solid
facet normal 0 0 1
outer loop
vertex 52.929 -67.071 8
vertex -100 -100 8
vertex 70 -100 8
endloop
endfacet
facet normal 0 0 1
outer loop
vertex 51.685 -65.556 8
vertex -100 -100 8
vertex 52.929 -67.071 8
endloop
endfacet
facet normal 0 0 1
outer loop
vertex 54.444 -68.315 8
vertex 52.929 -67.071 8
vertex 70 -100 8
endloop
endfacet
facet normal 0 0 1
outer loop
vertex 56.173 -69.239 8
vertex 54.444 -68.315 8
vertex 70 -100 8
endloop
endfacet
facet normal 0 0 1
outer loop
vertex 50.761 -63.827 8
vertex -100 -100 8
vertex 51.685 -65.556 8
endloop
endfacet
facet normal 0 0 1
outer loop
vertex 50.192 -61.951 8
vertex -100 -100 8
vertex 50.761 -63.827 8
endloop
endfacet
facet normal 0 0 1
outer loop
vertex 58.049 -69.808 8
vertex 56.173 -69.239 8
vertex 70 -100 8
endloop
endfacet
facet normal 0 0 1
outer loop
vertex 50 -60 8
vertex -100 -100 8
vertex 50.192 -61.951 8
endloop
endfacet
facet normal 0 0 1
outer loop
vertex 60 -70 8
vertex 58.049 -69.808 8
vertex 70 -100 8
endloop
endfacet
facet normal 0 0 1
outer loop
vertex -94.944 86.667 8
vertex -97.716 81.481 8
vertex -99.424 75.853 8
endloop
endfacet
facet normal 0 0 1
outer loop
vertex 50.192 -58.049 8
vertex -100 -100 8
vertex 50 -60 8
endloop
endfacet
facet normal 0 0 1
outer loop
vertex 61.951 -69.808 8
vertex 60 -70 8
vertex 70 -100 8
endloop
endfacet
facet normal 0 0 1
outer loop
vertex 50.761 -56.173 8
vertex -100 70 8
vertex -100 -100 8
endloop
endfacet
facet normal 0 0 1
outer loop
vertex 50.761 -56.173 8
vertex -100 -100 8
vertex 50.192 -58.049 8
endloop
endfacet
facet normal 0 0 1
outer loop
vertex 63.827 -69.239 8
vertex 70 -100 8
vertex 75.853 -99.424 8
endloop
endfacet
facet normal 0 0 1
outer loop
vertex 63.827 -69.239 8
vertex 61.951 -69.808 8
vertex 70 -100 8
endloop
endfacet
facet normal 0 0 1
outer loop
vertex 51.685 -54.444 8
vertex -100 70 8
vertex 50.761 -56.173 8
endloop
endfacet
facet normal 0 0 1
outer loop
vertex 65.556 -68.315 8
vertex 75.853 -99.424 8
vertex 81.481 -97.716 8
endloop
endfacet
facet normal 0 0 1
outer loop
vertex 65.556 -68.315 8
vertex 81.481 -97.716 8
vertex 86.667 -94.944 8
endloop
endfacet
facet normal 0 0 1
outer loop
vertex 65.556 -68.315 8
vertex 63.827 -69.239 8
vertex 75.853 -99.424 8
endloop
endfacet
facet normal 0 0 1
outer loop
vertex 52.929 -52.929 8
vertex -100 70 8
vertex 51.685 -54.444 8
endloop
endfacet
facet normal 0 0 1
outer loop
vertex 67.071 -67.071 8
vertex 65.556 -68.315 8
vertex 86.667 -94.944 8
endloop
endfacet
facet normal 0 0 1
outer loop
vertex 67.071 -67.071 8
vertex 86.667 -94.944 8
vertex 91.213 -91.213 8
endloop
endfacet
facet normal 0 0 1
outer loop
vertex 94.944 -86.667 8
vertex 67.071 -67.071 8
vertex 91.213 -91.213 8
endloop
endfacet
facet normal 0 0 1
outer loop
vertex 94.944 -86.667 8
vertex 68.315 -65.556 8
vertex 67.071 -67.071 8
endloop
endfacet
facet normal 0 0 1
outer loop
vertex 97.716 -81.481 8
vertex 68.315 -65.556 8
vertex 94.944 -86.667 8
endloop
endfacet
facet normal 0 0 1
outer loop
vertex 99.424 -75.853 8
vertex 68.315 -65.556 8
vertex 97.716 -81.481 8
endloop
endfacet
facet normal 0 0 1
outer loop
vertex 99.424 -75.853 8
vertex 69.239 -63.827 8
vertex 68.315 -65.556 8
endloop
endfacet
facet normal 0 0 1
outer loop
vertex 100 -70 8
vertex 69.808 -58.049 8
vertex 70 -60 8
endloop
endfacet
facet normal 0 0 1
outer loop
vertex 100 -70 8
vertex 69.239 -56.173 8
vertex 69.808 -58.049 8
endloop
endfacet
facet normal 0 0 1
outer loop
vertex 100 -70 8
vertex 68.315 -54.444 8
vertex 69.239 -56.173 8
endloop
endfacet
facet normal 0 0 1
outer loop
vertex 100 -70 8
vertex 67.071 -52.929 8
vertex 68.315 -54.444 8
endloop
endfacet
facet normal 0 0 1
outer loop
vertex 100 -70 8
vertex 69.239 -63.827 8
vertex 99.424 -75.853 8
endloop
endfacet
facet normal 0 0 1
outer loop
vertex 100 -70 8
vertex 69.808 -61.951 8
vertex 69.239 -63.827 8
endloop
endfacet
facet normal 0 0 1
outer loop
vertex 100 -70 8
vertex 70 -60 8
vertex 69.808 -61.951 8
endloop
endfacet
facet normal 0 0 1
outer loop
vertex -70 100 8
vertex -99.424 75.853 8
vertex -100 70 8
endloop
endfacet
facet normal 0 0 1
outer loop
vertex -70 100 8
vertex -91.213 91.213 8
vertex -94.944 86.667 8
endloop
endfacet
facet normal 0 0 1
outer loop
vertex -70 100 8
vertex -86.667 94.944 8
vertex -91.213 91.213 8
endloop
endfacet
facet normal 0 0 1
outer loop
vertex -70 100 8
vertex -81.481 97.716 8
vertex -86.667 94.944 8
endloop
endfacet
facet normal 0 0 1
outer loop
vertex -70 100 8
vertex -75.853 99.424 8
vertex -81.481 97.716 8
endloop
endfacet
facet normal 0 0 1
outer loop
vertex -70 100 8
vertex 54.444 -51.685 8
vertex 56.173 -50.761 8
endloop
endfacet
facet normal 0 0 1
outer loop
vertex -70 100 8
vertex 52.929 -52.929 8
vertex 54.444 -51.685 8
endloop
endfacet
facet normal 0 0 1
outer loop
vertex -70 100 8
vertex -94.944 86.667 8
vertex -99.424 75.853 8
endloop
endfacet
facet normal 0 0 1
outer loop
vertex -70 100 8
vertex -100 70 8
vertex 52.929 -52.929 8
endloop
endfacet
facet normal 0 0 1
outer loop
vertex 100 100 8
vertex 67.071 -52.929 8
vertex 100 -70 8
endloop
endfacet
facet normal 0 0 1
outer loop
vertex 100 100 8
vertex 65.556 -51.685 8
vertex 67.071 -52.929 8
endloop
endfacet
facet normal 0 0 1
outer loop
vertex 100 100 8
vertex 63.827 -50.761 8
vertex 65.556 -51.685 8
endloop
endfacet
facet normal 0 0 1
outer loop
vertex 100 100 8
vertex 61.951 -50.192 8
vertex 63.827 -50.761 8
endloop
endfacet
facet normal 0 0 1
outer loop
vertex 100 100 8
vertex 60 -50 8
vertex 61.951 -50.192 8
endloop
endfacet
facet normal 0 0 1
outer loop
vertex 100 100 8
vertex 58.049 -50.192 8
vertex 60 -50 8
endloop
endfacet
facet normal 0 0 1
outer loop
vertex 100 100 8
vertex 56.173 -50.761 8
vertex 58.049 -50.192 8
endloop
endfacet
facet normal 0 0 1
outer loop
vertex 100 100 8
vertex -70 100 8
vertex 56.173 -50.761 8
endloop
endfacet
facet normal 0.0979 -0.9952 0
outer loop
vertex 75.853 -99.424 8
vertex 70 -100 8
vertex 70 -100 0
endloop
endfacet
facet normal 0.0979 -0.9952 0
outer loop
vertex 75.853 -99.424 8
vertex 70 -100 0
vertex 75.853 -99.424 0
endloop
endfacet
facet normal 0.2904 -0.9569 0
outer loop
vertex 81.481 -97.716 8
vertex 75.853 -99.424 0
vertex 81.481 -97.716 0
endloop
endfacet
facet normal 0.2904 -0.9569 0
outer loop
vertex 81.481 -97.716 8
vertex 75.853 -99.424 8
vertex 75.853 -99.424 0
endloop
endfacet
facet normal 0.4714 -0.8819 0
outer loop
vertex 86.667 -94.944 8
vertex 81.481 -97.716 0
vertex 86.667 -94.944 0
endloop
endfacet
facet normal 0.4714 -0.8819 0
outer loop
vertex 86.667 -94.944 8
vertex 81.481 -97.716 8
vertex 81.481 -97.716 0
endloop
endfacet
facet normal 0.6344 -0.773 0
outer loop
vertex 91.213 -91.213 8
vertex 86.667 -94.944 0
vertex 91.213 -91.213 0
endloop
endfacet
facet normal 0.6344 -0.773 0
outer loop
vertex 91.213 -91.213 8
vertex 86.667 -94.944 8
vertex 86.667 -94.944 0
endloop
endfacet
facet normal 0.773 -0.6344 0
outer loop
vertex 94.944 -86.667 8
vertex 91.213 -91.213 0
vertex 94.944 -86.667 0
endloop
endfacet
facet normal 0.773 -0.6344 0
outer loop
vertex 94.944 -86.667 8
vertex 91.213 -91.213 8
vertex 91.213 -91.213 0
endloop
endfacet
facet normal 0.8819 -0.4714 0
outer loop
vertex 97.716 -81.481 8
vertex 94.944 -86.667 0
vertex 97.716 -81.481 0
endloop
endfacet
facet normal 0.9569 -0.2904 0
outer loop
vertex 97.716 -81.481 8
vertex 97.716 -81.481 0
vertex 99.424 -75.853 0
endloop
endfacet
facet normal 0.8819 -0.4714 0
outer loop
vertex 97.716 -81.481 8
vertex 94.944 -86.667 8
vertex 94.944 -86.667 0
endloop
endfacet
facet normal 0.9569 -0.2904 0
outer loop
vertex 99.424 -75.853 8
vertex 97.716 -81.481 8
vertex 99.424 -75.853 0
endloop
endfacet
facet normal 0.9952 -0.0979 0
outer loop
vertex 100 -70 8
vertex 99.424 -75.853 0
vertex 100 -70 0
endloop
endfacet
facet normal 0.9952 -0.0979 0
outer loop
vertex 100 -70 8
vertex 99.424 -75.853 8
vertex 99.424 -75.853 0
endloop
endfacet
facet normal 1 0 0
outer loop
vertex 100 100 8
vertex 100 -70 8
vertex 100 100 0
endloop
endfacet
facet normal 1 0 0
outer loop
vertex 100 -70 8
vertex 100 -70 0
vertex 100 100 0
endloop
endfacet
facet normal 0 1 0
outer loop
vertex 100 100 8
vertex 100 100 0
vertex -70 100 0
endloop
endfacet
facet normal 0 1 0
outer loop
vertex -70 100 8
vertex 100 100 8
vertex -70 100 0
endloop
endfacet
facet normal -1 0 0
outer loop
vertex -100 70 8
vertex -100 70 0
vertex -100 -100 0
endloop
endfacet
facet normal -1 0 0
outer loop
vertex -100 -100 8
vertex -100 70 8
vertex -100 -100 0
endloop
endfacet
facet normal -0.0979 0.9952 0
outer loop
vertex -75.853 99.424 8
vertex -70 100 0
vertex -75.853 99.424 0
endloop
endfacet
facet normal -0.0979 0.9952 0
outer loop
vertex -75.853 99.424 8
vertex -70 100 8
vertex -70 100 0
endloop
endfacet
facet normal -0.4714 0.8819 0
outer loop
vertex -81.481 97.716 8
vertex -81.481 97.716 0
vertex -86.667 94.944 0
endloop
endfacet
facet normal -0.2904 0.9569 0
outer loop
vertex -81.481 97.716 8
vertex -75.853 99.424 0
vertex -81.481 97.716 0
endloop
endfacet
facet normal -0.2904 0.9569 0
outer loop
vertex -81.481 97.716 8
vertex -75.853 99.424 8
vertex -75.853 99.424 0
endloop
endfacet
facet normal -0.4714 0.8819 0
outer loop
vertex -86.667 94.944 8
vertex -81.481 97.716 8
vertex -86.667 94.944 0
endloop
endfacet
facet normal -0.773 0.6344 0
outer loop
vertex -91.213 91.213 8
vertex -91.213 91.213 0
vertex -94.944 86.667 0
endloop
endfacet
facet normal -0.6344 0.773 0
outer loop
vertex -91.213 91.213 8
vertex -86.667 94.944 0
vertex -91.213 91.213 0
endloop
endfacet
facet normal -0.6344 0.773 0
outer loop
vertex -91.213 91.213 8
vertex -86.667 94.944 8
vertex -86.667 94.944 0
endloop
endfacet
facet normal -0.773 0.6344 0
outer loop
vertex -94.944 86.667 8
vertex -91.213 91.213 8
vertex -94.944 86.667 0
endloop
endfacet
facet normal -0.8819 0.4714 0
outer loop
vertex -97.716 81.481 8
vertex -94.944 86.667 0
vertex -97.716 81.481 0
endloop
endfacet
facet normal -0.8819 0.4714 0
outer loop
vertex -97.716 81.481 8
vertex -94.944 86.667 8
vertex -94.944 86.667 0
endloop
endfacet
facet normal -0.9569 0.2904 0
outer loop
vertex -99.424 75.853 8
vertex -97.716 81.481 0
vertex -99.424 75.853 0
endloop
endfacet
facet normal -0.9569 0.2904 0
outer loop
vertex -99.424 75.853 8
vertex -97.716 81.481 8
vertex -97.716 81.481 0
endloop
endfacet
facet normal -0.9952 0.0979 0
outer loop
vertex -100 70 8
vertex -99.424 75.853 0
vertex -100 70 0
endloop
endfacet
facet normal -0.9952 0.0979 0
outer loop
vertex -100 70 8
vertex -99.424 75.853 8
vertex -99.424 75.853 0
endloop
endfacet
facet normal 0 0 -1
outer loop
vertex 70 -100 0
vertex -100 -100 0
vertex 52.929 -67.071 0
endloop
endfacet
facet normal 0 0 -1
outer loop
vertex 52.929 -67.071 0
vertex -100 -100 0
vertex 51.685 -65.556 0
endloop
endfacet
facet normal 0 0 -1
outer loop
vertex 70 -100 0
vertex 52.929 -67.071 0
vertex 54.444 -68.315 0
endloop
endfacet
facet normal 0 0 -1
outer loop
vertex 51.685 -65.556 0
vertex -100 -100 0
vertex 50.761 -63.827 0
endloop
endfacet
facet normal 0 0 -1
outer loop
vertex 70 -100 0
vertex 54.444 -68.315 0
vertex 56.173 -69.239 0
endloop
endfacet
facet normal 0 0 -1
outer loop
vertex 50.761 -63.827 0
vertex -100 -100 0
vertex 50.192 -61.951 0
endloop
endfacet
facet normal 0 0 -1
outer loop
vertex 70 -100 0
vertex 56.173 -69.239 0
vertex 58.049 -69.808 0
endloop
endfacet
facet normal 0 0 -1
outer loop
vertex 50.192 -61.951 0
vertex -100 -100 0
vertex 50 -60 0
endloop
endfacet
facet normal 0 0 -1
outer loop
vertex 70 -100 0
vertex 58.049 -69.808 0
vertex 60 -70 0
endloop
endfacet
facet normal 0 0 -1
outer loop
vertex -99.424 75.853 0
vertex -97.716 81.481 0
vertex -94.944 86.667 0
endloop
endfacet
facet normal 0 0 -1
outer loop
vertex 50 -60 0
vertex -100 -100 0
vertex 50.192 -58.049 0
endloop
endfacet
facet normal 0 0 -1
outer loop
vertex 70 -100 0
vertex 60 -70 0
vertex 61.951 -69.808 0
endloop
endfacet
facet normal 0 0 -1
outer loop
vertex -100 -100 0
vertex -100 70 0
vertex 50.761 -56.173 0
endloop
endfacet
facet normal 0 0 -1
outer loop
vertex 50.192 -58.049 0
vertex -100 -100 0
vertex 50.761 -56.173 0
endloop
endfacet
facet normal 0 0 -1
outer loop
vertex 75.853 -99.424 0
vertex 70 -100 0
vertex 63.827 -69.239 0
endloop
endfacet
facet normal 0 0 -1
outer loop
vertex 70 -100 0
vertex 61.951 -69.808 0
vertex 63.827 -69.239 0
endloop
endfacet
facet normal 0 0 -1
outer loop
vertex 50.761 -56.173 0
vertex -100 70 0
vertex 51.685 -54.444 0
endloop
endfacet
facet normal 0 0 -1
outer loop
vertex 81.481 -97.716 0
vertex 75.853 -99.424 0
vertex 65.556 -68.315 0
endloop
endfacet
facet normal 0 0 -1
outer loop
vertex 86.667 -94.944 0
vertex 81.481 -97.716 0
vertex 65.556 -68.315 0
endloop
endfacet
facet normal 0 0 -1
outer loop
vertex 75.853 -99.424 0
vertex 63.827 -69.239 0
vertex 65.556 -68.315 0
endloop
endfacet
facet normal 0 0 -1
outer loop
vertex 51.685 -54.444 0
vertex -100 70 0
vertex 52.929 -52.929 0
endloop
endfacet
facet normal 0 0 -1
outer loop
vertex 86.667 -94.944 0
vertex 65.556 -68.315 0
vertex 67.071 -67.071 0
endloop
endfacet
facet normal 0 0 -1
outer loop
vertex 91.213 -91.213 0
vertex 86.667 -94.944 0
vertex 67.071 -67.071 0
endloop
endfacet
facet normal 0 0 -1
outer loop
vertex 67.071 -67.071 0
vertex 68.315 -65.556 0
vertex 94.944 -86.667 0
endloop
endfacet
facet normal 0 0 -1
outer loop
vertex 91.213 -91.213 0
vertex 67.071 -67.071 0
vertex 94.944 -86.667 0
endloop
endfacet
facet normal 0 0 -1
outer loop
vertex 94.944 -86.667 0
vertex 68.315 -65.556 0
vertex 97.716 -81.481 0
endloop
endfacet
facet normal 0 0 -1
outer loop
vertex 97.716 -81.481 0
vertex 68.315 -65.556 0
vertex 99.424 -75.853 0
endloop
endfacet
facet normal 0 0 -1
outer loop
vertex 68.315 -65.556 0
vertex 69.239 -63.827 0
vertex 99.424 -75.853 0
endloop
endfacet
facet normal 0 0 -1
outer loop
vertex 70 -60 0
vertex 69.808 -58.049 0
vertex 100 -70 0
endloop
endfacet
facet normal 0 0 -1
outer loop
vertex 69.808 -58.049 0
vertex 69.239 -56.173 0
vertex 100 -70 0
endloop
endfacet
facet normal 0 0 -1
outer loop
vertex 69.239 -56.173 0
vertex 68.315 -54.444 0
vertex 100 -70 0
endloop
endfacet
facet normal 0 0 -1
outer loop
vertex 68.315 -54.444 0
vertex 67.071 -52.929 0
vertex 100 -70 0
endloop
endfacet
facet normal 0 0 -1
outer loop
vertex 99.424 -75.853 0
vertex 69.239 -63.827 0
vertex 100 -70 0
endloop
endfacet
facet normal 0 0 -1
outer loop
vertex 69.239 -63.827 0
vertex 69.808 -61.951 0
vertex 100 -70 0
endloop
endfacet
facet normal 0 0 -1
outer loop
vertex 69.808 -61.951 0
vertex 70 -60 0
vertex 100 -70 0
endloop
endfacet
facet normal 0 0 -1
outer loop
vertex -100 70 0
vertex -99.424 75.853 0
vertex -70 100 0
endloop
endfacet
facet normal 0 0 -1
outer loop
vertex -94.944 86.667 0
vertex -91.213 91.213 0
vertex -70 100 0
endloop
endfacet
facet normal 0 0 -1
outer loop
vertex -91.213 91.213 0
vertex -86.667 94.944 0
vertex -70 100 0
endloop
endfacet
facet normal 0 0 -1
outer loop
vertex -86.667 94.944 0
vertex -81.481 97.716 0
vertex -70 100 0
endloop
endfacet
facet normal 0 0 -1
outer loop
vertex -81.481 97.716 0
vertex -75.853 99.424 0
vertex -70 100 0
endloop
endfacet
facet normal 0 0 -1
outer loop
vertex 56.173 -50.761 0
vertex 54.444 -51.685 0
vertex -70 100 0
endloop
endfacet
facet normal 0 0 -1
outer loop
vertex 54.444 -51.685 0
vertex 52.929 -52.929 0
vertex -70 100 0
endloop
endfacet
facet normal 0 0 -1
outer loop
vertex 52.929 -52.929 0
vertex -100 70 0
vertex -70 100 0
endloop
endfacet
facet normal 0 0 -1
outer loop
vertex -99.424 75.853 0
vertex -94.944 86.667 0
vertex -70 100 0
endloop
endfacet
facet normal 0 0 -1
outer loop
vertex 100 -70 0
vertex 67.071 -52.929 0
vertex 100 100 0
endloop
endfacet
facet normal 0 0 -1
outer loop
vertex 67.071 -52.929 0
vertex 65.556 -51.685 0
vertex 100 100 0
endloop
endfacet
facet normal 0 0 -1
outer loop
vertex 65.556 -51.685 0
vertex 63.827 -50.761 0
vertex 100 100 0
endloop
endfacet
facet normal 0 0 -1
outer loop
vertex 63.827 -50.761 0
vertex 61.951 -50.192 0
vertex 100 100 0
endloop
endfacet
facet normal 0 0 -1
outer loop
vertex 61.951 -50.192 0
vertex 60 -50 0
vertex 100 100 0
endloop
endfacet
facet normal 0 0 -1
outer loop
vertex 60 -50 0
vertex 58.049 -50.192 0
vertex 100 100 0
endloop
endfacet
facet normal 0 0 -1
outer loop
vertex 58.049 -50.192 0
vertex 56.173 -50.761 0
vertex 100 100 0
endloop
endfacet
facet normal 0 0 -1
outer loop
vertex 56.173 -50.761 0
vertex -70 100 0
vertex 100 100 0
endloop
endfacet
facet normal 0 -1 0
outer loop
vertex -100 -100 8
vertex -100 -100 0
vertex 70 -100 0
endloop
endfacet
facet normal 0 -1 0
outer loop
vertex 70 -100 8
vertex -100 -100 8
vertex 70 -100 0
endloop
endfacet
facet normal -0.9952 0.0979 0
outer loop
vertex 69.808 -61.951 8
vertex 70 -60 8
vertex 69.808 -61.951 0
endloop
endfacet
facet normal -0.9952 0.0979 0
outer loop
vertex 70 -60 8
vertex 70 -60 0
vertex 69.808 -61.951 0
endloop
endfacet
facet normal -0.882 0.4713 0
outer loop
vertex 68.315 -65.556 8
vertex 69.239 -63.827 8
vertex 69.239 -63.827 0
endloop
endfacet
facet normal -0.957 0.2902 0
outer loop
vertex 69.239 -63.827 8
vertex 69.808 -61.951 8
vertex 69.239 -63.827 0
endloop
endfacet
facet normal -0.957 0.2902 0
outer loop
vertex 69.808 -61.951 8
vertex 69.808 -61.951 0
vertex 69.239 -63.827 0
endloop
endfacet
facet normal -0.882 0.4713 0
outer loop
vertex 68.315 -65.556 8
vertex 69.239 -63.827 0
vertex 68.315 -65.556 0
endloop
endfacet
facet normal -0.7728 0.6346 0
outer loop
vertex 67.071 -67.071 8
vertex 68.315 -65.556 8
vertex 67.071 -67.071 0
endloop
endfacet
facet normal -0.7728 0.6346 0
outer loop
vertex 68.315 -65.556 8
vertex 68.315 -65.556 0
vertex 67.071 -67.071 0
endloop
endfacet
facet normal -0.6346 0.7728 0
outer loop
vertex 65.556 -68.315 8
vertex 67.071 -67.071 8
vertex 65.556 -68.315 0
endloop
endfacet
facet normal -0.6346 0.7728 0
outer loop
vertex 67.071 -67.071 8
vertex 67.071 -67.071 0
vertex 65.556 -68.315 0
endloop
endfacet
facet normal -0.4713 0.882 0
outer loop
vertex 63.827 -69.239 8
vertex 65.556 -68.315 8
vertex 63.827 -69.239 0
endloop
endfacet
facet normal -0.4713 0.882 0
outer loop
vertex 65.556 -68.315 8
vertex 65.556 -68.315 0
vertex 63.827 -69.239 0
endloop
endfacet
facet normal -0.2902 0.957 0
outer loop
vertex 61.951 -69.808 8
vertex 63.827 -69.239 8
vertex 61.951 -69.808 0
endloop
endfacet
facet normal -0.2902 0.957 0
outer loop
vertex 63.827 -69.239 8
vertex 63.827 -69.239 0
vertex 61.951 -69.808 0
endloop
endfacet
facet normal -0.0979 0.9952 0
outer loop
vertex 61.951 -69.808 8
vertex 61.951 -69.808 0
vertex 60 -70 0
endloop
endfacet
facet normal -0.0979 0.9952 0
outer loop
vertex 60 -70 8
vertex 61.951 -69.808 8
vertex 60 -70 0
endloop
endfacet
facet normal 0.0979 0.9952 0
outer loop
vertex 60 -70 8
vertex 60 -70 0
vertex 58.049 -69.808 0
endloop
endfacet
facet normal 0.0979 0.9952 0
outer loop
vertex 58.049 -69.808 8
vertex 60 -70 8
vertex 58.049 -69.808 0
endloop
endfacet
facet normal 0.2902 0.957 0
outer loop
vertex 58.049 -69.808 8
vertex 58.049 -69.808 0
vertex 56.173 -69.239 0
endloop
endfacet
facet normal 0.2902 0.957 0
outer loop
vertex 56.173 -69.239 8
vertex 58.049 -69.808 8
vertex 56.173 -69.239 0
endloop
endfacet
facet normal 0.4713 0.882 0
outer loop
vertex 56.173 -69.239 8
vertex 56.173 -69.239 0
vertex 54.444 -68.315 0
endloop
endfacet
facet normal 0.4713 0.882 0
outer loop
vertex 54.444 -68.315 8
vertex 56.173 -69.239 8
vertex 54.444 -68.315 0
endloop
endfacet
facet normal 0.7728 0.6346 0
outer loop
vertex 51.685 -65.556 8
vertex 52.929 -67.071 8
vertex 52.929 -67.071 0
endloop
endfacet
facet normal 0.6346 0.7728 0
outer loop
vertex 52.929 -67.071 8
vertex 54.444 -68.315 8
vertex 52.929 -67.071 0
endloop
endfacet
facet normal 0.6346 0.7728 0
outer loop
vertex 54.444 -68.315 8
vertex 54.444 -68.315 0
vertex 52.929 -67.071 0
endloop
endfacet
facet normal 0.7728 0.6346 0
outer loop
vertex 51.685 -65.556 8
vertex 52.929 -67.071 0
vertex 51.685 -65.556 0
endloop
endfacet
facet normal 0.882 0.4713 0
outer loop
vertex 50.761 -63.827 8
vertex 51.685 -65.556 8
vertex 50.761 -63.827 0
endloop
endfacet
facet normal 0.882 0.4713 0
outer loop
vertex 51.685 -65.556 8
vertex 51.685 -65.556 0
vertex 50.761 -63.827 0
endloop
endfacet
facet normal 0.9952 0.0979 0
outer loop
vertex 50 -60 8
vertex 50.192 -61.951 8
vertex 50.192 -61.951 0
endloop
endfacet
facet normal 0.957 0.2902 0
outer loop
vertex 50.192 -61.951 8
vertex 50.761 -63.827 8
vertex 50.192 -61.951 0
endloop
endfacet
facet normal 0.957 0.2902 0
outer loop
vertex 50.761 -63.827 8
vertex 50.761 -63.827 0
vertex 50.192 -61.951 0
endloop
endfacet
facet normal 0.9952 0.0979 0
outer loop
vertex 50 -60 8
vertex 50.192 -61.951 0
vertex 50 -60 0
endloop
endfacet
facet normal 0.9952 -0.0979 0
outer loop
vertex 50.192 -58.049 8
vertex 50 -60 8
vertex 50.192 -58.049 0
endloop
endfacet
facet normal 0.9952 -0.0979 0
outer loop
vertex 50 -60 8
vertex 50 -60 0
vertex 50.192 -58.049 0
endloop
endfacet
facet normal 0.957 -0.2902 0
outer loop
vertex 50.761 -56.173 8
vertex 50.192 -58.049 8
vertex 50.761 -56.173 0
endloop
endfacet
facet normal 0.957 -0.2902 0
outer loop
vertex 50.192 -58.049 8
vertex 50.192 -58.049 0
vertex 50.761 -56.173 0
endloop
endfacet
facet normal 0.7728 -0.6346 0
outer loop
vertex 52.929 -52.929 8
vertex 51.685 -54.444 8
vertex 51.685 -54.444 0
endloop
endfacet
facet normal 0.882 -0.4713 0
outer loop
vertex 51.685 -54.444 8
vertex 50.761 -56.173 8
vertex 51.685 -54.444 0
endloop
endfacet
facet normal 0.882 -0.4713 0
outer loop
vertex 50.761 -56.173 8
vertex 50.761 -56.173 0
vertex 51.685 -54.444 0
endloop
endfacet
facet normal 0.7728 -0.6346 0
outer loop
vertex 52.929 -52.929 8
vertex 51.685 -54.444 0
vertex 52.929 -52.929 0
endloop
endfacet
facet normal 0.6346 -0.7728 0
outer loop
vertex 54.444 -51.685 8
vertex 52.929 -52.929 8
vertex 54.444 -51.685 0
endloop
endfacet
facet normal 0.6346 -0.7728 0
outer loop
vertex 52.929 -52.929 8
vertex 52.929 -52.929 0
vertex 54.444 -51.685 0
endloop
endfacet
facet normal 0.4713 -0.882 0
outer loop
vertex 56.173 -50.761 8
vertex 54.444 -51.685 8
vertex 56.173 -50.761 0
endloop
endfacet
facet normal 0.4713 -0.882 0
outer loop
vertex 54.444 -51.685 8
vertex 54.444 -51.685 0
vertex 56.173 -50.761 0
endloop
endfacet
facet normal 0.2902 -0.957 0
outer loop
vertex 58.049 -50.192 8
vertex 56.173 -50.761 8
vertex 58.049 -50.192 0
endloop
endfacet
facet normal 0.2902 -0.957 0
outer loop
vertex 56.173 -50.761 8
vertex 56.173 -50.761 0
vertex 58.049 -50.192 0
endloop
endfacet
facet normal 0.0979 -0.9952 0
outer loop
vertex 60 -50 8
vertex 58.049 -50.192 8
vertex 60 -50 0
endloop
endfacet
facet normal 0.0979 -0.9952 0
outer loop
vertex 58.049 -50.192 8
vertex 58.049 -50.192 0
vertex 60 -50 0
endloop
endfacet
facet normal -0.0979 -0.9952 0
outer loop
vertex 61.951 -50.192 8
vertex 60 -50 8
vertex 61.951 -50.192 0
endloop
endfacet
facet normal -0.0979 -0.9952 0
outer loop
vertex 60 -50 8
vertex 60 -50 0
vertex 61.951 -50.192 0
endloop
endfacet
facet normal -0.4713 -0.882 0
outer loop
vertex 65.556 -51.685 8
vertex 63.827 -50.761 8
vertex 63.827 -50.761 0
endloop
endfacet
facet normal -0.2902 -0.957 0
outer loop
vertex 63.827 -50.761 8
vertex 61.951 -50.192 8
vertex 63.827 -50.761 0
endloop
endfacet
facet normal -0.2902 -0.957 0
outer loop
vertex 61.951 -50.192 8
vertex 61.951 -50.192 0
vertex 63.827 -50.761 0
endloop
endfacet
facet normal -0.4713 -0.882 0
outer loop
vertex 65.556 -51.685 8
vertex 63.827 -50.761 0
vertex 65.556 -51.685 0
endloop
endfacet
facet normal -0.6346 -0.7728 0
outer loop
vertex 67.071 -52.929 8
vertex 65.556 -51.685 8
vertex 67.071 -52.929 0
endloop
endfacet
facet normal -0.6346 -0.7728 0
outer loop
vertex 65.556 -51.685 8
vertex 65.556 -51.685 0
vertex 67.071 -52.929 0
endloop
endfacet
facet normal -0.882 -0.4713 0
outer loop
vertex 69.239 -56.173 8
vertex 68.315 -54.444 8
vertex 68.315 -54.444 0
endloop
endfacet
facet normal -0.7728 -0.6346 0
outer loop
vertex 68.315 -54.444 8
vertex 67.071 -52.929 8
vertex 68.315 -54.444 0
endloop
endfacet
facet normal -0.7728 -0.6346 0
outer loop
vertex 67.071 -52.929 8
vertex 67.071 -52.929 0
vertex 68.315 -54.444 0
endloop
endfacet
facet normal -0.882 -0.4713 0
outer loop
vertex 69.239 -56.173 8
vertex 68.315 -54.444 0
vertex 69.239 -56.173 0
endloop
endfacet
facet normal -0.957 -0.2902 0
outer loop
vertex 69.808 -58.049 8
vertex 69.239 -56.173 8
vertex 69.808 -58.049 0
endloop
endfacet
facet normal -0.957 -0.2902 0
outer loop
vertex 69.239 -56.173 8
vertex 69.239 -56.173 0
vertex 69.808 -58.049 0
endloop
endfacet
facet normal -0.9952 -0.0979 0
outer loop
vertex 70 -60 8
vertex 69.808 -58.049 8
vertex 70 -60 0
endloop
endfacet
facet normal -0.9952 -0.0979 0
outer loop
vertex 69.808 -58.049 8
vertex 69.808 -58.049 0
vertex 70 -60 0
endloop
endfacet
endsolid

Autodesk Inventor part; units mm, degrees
ref_plane "YZ Plane" through (0, 0, 0) normal (1, 0, 0) x (0, 1, 0)
ref_plane "XZ Plane" through (0, 0, 0) normal (0, 1, 0) x (-1, 0, 0)
ref_plane "XY Plane" through (0, 0, 0) normal (0, 0, 1) x (1, 0, 0)
sketch "Sketch1" plane through (0, 0, 0) normal (0, 0, 1) x (1, 0, 0)
  line L0 (-100, -100) -> (100, -100)
  line L1 (100, -100) -> (100, 100)
  line L2 (100, 100) -> (-100, 100)
  line L3 (-100, 100) -> (-100, -100)
  line L4 (-100, -100) -> (100, 100) construction
  line L5 (100, -100) -> (-100, 100) construction
  circle A0 centre (60, -60) radius 10
  line L6 (-40, 100) -> (-40, 40)
  line L7 (-40, 40) -> (-100, 40)
  point P0 (0, 0)
  dimension "d154" = 200
  dimension "d155" = 200
  dimension "d157" = 20
  dimension "d158" = 40
  dimension "d159" = 40
  dimension "d161" = 60
extrude "Plate5" add sketch "Sketch1" along normal blind 8
fillet "Corner Round1" radius 30 2 edges at (100, -100, 4) (-100, 100, 4)
properties part number "PNS-071 stretch ring" material "Stainless Steel"
